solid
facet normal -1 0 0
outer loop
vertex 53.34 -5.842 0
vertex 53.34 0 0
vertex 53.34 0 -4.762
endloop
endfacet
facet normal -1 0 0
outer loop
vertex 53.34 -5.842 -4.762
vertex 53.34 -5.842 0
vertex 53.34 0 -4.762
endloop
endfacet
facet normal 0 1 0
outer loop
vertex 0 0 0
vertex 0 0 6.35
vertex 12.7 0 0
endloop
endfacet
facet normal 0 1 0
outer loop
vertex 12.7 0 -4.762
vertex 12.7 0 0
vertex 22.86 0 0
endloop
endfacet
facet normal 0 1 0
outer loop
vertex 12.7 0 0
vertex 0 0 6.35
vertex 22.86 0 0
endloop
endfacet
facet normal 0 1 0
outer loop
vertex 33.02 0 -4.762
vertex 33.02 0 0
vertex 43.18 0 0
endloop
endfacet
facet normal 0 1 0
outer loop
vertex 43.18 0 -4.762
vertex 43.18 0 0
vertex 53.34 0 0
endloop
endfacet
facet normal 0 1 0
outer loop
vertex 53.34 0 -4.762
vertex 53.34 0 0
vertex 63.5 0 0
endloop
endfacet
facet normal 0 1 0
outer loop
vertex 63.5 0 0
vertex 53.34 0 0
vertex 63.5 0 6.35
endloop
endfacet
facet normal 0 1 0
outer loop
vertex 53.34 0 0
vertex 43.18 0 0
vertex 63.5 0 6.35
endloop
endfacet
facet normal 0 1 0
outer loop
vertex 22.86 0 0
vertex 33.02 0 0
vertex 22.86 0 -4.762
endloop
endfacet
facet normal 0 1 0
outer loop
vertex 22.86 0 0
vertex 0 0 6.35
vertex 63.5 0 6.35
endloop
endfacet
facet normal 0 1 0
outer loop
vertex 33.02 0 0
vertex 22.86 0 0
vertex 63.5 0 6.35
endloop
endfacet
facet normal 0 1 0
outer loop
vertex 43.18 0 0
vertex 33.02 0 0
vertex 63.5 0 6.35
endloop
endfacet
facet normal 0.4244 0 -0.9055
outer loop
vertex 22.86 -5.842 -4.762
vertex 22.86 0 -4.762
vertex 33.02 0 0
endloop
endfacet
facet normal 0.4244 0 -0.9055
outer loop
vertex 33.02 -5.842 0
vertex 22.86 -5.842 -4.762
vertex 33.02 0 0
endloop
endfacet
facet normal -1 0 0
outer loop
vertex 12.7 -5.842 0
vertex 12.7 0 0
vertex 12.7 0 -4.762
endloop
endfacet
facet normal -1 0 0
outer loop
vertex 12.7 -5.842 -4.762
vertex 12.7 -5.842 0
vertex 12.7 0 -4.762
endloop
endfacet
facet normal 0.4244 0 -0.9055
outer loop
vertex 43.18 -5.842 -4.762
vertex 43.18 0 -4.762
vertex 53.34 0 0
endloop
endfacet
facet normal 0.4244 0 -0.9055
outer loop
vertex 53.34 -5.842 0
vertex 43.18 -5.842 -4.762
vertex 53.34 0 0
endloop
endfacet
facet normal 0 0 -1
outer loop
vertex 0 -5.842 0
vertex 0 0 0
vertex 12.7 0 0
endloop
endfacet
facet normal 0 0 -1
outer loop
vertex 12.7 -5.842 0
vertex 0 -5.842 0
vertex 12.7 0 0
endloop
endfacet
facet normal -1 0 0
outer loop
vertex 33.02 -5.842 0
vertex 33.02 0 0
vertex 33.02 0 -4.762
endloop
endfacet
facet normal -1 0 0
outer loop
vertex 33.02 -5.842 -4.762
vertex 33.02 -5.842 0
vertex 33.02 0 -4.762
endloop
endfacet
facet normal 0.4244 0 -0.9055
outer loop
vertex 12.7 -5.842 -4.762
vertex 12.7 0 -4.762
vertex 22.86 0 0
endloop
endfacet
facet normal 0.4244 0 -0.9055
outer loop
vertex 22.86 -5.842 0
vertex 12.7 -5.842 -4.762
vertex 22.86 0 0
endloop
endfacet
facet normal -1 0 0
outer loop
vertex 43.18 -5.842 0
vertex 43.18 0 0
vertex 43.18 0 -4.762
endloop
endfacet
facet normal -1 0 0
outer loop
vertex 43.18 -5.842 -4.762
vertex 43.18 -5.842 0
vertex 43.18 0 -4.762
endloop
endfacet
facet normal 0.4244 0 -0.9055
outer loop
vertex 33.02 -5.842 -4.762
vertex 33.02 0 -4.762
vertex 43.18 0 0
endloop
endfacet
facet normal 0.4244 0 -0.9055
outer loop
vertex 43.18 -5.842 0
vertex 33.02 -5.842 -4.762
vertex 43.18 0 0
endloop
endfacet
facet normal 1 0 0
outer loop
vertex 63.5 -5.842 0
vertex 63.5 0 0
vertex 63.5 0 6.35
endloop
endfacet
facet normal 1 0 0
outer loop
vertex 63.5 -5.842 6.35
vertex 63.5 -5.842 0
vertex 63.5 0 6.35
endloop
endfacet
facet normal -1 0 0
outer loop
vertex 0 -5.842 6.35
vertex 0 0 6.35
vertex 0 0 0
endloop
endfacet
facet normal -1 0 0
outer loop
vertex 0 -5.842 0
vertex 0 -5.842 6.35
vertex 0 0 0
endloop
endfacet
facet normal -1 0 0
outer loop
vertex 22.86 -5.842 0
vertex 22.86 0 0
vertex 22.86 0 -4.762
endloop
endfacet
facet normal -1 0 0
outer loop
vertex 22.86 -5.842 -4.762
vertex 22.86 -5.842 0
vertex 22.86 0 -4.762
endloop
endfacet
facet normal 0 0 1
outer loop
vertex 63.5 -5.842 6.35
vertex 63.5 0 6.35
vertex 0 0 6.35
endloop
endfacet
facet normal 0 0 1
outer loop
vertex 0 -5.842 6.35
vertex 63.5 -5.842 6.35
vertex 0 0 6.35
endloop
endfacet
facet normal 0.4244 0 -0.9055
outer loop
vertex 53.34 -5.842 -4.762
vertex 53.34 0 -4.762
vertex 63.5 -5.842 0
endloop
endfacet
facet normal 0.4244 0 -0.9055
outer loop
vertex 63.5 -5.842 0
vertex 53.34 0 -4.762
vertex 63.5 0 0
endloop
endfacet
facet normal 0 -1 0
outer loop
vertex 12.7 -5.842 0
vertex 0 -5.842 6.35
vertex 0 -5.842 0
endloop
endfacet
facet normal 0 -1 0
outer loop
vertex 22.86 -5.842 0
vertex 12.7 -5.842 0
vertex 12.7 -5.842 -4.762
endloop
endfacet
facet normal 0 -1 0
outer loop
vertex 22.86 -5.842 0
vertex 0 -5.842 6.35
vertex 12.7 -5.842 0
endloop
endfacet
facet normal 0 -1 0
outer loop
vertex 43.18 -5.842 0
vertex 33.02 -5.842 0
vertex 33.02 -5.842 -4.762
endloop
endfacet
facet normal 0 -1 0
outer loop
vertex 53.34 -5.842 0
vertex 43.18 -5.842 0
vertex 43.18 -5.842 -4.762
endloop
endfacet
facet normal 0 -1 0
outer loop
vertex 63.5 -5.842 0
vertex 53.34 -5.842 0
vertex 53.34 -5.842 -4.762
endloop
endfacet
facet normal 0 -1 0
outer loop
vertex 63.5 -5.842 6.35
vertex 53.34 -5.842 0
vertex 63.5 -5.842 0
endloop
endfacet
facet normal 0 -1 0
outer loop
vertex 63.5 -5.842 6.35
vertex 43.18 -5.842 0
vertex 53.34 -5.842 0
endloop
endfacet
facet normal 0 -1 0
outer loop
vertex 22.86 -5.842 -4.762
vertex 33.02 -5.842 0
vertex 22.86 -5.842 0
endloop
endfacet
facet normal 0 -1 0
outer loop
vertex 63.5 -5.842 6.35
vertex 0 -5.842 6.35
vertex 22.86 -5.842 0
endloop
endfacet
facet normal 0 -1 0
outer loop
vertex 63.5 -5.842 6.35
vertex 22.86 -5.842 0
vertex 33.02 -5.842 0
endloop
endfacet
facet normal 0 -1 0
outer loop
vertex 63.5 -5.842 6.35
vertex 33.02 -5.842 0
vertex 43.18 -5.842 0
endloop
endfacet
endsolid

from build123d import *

# Parameters (mm, degrees)
F1_DEPTH = 5.842


with BuildPart() as f1:
    # F0 (on Front) → F1 (new body)
    with BuildSketch(Plane.XZ):
        Polygon((0, 6.35), (0, 0), (12.7, 0), (22.86, 0), (33.02, 0), (43.18, 0), (53.34, 0), (63.5, 0), (63.5, 6.35), align=None)
        Polygon((22.86, 0), (12.7, 0), (12.7, -4.7625), align=None)
        Polygon((33.02, 0), (22.86, 0), (22.86, -4.7625), align=None)
        Polygon((43.18, 0), (33.02, 0), (33.02, -4.7625), align=None)
        Polygon((53.34, -4.7625), (63.5, 0), (53.34, 0), align=None)
        Polygon((53.34, 0), (43.18, 0), (43.18, -4.7625), align=None)
    extrude(amount=F1_DEPTH)


solid = f1.part
